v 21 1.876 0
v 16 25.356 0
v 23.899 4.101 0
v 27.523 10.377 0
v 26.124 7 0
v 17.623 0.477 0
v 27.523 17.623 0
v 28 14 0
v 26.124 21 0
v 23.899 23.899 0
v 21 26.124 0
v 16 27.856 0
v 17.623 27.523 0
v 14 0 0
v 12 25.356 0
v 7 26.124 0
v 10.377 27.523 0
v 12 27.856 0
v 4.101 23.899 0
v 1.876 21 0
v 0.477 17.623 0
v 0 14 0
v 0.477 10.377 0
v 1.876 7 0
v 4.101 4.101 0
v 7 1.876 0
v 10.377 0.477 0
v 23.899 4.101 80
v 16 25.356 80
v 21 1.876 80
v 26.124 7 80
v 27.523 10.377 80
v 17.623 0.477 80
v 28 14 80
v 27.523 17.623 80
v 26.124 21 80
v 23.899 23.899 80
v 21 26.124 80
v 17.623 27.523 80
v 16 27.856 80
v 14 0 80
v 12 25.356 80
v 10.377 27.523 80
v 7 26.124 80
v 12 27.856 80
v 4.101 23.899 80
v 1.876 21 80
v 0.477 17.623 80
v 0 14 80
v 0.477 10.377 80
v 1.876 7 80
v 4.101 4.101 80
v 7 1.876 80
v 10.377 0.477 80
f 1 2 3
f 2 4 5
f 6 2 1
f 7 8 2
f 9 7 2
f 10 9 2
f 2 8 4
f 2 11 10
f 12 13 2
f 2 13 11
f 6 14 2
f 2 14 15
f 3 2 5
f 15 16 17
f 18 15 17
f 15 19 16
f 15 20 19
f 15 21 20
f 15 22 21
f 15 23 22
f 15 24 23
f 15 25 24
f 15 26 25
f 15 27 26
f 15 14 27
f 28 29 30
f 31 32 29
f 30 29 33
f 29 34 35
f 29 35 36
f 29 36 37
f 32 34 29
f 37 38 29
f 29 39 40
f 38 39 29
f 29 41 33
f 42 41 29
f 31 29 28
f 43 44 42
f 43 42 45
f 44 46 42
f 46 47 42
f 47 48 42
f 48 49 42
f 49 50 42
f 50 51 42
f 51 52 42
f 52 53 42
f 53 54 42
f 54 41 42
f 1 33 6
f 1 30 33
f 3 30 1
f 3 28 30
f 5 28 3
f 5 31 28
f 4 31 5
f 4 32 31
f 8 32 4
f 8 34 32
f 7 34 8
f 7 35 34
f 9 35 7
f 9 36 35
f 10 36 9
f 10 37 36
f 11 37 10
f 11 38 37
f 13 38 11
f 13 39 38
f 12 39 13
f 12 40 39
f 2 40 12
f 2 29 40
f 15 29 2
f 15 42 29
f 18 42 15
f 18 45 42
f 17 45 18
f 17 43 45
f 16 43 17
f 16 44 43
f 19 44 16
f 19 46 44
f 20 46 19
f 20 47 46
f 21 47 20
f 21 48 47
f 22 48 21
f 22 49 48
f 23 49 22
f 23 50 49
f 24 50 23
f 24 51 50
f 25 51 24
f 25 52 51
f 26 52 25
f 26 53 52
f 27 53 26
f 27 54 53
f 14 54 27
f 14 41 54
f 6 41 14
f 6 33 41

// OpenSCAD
$fn = 32;

// ----------------------------------------------------------------------
// Keyway shaft: d28 shaft, key 4 x 2.5 mm
// ----------------------------------------------------------------------

// --- parameters (mm) ---
shaft_r = 14;             // shaft radius
key_w = 4;                // keyway width
key_d = 2.5;              // keyway depth below the surface line
plate_t = 80;             // shaft length, Z (extrusion height)

shaft_d = 2 * shaft_r;  // shaft diameter
circle_step = 15;  // polygon sampling step, degrees

profile = [[10.377, 27.523], [7, 26.124], [4.101, 23.899], [1.876, 21], [0.477, 17.623], [0, 14], [0.477, 10.377], [1.876, 7], [4.101, 4.101], [7, 1.876], [10.377, 0.477], [14, 0], [17.623, 0.477], [21, 1.876], [23.899, 4.101], [26.124, 7], [27.523, 10.377], [28, 14], [27.523, 17.623], [26.124, 21], [23.899, 23.899], [21, 26.124], [17.623, 27.523], [16, 27.856], [16, 25.356], [12, 25.356], [12, 27.856]];  // primary outline, 27 points, counter clockwise

// --- the one profile operation ---
linear_extrude(height = plate_t) polygon(points = profile);
